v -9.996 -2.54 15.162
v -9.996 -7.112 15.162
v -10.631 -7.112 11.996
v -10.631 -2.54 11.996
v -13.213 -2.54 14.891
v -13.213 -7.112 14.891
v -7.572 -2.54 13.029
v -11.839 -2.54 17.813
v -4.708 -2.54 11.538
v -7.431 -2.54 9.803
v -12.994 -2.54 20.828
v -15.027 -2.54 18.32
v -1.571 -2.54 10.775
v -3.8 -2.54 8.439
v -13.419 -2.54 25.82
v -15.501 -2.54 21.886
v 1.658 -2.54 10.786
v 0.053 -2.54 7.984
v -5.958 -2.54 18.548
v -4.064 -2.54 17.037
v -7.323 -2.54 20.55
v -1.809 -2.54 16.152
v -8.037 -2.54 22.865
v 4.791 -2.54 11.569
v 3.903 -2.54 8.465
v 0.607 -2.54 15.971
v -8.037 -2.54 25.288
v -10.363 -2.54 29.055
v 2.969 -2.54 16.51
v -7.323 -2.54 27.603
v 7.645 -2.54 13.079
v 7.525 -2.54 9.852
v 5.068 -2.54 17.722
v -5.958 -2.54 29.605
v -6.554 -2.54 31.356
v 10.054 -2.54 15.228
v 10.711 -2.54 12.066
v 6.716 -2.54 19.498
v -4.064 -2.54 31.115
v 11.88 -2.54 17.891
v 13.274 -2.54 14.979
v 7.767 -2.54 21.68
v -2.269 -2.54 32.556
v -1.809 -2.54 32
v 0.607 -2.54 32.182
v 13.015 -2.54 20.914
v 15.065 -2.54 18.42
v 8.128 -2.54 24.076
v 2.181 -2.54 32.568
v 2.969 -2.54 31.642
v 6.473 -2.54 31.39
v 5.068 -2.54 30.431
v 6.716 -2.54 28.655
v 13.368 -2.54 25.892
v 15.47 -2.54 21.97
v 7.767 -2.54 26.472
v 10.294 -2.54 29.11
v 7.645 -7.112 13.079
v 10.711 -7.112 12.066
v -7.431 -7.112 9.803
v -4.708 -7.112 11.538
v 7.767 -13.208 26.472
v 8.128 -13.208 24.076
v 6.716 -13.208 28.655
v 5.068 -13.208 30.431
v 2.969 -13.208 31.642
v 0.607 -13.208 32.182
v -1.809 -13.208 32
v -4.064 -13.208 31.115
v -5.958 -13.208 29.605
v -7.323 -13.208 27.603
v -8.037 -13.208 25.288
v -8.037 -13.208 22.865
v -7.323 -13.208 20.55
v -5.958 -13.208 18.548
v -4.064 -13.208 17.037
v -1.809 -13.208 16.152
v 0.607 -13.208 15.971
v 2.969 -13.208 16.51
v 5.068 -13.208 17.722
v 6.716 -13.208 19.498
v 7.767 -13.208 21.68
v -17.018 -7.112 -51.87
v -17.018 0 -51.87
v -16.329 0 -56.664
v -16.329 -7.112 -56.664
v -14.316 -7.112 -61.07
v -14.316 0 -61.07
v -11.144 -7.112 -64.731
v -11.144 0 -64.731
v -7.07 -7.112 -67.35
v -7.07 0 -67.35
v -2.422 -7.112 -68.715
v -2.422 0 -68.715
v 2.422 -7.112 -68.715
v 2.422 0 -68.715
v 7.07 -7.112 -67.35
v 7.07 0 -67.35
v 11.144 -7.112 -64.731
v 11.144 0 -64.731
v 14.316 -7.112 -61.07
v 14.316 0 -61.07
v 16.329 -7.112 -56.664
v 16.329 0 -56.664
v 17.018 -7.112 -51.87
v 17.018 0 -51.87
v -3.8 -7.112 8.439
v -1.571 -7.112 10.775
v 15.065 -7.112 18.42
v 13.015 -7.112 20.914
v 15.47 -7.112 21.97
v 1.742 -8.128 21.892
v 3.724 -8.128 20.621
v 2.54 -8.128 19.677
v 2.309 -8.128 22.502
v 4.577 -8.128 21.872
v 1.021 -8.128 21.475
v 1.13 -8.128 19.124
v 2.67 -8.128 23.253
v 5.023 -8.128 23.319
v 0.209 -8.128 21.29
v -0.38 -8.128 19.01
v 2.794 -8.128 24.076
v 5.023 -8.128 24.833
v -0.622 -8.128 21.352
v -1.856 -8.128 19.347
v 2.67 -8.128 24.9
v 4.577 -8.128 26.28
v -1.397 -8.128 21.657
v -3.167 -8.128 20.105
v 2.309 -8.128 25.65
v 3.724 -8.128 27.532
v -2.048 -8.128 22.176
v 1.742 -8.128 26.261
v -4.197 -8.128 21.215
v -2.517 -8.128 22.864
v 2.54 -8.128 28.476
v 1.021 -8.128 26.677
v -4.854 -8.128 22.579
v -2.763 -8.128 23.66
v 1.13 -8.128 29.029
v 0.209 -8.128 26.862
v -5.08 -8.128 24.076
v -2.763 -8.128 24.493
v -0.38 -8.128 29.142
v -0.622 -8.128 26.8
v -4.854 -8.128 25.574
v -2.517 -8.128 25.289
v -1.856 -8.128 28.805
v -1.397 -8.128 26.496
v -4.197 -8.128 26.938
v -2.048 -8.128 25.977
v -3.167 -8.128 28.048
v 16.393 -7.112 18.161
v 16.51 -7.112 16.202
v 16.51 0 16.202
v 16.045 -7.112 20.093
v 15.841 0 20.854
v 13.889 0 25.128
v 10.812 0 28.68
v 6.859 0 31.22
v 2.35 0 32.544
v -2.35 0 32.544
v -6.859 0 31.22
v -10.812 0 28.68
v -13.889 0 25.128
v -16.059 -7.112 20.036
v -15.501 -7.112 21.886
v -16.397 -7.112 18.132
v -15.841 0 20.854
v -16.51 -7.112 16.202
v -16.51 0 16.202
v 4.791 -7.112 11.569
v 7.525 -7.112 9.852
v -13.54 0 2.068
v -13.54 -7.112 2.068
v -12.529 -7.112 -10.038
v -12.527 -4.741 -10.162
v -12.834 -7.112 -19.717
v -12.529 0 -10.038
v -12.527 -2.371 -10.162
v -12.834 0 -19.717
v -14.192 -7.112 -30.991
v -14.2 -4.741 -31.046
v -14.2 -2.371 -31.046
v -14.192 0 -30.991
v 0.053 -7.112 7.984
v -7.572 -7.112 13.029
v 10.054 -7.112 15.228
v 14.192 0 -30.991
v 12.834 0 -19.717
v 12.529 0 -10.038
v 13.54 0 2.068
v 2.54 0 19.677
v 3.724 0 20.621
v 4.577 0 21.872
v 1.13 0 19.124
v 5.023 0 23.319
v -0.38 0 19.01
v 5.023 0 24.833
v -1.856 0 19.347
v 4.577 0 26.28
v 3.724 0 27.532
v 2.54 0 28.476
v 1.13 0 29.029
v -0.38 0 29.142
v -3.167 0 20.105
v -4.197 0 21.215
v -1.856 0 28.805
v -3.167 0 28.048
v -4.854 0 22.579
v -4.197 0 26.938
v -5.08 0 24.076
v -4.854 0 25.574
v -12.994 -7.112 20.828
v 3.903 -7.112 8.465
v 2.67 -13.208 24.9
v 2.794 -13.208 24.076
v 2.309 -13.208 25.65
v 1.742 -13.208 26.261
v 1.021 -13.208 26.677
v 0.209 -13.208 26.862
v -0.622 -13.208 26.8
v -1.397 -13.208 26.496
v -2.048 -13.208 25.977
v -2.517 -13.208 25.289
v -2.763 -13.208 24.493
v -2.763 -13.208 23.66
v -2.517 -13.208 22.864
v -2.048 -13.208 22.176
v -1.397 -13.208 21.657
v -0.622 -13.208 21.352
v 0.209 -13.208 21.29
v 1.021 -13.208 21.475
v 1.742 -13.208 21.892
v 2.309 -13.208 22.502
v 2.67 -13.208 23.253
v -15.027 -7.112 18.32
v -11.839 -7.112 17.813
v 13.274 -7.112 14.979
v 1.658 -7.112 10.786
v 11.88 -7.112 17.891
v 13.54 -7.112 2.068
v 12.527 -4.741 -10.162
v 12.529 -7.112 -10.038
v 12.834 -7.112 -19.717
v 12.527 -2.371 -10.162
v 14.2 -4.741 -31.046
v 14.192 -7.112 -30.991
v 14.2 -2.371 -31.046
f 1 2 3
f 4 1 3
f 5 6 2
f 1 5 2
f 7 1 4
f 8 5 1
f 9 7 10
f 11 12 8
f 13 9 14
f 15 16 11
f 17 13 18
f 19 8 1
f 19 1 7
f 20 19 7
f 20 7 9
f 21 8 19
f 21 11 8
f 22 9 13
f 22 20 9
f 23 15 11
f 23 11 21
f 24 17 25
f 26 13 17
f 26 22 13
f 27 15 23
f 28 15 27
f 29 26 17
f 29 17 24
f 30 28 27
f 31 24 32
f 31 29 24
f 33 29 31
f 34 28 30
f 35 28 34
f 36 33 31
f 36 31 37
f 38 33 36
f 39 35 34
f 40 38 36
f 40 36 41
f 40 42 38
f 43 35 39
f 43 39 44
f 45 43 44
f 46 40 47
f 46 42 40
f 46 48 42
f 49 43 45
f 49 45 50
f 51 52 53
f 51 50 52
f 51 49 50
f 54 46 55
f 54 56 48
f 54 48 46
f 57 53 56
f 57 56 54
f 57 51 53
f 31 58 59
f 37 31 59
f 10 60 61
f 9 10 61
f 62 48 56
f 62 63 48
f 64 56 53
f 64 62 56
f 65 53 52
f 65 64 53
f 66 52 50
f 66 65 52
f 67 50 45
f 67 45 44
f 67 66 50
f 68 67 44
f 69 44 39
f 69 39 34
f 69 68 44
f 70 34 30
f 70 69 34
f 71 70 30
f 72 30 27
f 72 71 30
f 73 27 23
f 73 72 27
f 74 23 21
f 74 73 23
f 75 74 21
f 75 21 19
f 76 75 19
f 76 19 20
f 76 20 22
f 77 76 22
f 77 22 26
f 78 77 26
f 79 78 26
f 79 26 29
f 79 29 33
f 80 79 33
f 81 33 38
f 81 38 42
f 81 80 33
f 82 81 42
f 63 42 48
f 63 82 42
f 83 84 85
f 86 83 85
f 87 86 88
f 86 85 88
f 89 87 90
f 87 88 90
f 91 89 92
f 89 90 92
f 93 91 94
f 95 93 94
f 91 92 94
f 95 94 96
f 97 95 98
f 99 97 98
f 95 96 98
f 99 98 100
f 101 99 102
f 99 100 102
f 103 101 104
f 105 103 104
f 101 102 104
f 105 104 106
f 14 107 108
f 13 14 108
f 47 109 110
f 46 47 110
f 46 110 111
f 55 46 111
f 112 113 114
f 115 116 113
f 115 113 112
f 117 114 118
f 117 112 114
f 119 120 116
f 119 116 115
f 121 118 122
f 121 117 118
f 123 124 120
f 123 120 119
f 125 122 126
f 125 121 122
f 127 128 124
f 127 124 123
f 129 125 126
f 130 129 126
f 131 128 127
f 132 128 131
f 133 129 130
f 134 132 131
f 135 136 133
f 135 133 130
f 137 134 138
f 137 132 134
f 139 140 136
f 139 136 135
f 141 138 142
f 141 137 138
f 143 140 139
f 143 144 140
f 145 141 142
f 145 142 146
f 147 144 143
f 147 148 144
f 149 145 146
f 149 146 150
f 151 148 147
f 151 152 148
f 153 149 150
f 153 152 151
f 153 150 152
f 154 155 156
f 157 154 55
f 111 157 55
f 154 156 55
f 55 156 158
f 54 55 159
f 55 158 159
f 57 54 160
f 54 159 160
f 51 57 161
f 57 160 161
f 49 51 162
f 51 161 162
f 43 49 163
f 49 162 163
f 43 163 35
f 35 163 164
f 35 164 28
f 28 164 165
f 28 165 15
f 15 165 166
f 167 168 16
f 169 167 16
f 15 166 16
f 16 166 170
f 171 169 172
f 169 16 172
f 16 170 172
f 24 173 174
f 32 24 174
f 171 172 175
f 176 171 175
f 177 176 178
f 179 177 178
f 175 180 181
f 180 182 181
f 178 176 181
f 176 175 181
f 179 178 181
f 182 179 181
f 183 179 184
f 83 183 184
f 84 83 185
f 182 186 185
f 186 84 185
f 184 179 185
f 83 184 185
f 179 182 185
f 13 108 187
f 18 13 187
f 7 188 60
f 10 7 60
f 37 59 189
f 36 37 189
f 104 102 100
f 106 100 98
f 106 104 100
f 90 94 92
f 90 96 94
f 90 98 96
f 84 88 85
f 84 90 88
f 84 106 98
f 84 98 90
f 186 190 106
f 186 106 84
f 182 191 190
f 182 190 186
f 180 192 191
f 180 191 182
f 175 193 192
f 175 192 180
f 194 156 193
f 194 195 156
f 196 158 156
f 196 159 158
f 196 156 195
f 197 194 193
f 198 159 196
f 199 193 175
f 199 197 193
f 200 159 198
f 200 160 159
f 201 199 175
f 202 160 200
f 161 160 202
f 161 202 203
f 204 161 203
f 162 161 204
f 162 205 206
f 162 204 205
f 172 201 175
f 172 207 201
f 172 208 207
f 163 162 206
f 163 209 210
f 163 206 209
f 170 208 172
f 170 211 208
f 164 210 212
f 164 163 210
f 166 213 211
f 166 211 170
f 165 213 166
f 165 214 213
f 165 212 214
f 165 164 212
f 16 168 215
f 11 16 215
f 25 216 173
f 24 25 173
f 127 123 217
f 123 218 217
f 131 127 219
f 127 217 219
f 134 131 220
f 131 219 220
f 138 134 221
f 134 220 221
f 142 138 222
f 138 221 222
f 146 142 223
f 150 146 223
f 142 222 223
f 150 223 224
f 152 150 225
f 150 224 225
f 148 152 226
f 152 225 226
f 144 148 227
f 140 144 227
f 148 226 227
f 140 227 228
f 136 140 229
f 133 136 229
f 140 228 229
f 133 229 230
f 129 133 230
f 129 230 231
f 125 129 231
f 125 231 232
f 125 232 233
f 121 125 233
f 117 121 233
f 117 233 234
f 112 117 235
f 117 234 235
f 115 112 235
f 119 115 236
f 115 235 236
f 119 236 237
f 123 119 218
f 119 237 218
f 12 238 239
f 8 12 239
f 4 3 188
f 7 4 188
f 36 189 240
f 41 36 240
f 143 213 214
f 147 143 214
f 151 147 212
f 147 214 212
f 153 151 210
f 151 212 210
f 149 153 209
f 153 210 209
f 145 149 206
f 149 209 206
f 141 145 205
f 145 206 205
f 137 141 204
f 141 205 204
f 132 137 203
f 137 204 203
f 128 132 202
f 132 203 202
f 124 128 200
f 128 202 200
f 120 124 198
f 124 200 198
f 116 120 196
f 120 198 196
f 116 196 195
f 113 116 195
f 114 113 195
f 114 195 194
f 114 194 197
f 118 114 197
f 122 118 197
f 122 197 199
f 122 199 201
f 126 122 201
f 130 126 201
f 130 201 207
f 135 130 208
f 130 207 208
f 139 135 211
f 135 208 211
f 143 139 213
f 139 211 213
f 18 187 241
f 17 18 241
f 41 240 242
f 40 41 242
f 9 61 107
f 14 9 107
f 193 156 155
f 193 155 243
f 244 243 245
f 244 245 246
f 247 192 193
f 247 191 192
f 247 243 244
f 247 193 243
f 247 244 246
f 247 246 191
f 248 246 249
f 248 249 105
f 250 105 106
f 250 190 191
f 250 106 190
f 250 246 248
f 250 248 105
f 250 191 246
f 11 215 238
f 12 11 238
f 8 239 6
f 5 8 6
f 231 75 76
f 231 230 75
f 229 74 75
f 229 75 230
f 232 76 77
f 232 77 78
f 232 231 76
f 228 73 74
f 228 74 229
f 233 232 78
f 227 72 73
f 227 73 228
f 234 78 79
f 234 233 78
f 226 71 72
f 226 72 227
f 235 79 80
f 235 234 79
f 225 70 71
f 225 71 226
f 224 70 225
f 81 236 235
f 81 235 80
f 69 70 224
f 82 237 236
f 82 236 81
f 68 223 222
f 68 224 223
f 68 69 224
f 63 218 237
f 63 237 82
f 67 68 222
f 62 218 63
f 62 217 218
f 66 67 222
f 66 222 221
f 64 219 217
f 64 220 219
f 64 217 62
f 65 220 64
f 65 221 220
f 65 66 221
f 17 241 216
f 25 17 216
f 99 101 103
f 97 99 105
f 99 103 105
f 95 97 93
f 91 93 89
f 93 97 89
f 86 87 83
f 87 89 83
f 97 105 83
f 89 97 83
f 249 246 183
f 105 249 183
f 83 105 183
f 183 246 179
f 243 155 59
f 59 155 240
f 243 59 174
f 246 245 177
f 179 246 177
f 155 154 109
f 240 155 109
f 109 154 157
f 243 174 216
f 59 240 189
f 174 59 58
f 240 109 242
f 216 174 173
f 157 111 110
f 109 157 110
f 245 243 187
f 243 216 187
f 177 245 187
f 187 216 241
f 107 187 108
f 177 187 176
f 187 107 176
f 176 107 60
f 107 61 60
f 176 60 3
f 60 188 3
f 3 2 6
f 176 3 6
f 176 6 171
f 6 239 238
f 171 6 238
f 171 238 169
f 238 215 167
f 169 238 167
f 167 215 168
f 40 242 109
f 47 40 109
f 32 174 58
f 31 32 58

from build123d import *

# Parameters (mm, degrees)
F1_DEPTH = 7.112
F2_R     = 8.128
F2_R_2   = 2.794
F3_DEPTH = 6.096
F4_DEPTH = 50.8
F5_R     = 8.128
F6_DEPTH = 4.572
F7_R     = 5.08
F7_R_2   = 2.794
F8_DEPTH = 8.128


with BuildPart() as f1:
    # F0 (on Front) → F1 (new body)
    with BuildSketch(Plane.XZ):
        with BuildLine():
            add(Edge.make_bspline(
                [(16.51, 16.2022389048), (8.1950903917, -14.7107664531), (15.1309384414, -29.2677398155), (17.018, -51.8697610952)],
                knots=[0, 0, 0, 0, 68.073895496, 68.073895496, 68.073895496, 68.073895496], degree=3))
            ThreePointArc((16.51, 16.2022389048), (0, 32.7122389048), (-16.51, 16.2022389048))
            add(Edge.make_bspline(
                [(-16.51, 16.2022389048), (-8.1950903917, -14.7107664531), (-15.1309384414, -29.2677398155), (-17.018, -51.8697610952)],
                knots=[0, 0, 0, 0, 68.073895496, 68.073895496, 68.073895496, 68.073895496], degree=3))
            ThreePointArc((-17.018, -51.8697610952), (0, -68.8877610952), (17.018, -51.8697610952))
        make_face()
    extrude(amount=F1_DEPTH)

    # F2 (on face) → F3 (join)
    with BuildSketch(Plane.XZ.offset(7.112)):
        with Locations((0, 24.0762389048)):
            Circle(F2_R)
        with Locations((0, 24.0762389048)):
            Circle(F2_R_2, mode=Mode.SUBTRACT)
    extrude(amount=F3_DEPTH)

    # F4 (cut, symmetric): a face of the model
    f4_faces = [f1.faces().sort_by_distance(p)[0] for p in [
        (0, -7.112, 24.0762389048),
    ]]
    extrude(f4_faces, amount=F4_DEPTH, both=True, mode=Mode.SUBTRACT)

    # F5 (on face) → F6 (cut)
    with BuildSketch(Plane.XZ.offset(7.112)):
        with BuildLine():
            ThreePointArc((15.469928865, 21.9695087018), (-0.0442530739, 32.7121795972), (-15.5006234178, 21.8864955545))
            Line((-15.5006234178, 21.8864955545), (-12.9936152173, 20.8281131752))
            Line((-12.9936152173, 20.8281131752), (-15.0273981388, 18.3203464733))
            Line((-15.0273981388, 18.3203464733), (-11.8387170074, 17.8129221485))
            Line((-11.8387170074, 17.8129221485), (-13.2132540393, 14.8913104783))
            Line((-13.2132540393, 14.8913104783), (-9.995795597, 15.1617323254))
            Line((-9.995795597, 15.1617323254), (-10.6312036432, 11.9960691377))
            Line((-10.6312036432, 11.9960691377), (-7.5719548797, 13.0286212217))
            Line((-7.5719548797, 13.0286212217), (-7.4313063342, 9.8028833542))
            Line((-7.4313063342, 9.8028833542), (-4.7080596678, 11.5375575014))
            Line((-4.7080596678, 11.5375575014), (-3.7995285128, 8.4392131139))
            Line((-3.7995285128, 8.4392131139), (-1.570549141, 10.7751963679))
            Line((-1.570549141, 10.7751963679), (0.0530640951, 7.9843099742))
            Line((0.0530640951, 7.9843099742), (1.6582359931, 10.7858434794))
            Line((1.6582359931, 10.7858434794), (3.9025728106, 8.4646112522))
            Line((3.9025728106, 8.4646112522), (4.7906504787, 11.5688800644))
            Line((4.7906504787, 11.5688800644), (7.5252781797, 9.8522035834))
            Line((7.5252781797, 9.8522035834), (7.6446497718, 13.0787988828))
            Line((7.6446497718, 13.0787988828), (10.7106417342, 12.0664451452))
            Line((10.7106417342, 12.0664451452), (10.0543698074, 15.2278489412))
            Line((10.0543698074, 15.2278489412), (13.2735417227, 14.9786522665))
            Line((13.2735417227, 14.9786522665), (11.8797664159, 17.8911352617))
            Line((11.8797664159, 17.8911352617), (15.0650317137, 18.4195780548))
            Line((15.0650317137, 18.4195780548), (13.0147541814, 20.913877324))
            Line((13.0147541814, 20.913877324), (15.469928865, 21.9695087018))
        make_face()
        with BuildLine():
            Line((-11.7664292563, 17.8014187834), (-11.8387170074, 17.8129221485))
            Line((-11.8387170074, 17.8129221485), (-11.8075561021, 17.8791554056))
            ThreePointArc((-11.8075561021, 17.8791554056), (-11.7870567643, 17.84025319), (-11.7664292563, 17.8014187834))
        make_face(mode=Mode.SUBTRACT)
        with BuildLine():
            Line((-9.9228554611, 15.1678628183), (-9.995795597, 15.1617323254))
            Line((-9.995795597, 15.1617323254), (-9.9813908269, 15.2334982572))
            ThreePointArc((-9.9813908269, 15.2334982572), (-9.952177253, 15.2006322819), (-9.9228554611, 15.1678628183))
        make_face(mode=Mode.SUBTRACT)
        with BuildLine():
            Line((-12.9261809524, 20.7996444858), (-12.9936152173, 20.8281131752))
            Line((-12.9936152173, 20.8281131752), (-12.9475091354, 20.8849645215))
            ThreePointArc((-12.9475091354, 20.8849645215), (-12.9369153807, 20.842286921), (-12.9261809524, 20.7996444858))
        make_face(mode=Mode.SUBTRACT)
        with BuildLine():
            Line((-7.5026013746, 13.0520292908), (-7.5719548797, 13.0286212217))
            Line((-7.5719548797, 13.0286212217), (-7.5751433977, 13.1017490531))
            ThreePointArc((-7.5751433977, 13.1017490531), (-7.5389133745, 13.0768293692), (-7.5026013746, 13.0520292908))
        make_face(mode=Mode.SUBTRACT)
        with BuildLine():
            Line((-4.646323367, 11.5768827546), (-4.7080596678, 11.5375575014))
            Line((-4.7080596678, 11.5375575014), (-4.7286561687, 11.6077973086))
            ThreePointArc((-4.7286561687, 11.6077973086), (-4.6875152535, 11.5922721575), (-4.646323367, 11.5768827546))
        make_face(mode=Mode.SUBTRACT)
        with BuildLine():
            Line((-1.5200179341, 10.8281533646), (-1.570549141, 10.7751963679))
            Line((-1.570549141, 10.7751963679), (-1.6073566312, 10.8384660687))
            ThreePointArc((-1.6073566312, 10.8384660687), (-1.5636957843, 10.8332377157), (-1.5200179341, 10.8281533646))
        make_face(mode=Mode.SUBTRACT)
        with BuildLine():
            Line((1.6946254161, 10.8493545514), (1.6582359931, 10.7858434794))
            Line((1.6582359931, 10.7858434794), (1.6073566312, 10.8384660687))
            ThreePointArc((1.6073566312, 10.8384660687), (1.651, 10.8438383667), (1.6946254161, 10.8493545514))
        make_face(mode=Mode.SUBTRACT)
        with BuildLine():
            Line((4.8107832969, 11.639254179), (4.7906504787, 11.5688800644))
            Line((4.7906504787, 11.5688800644), (4.7286561687, 11.6077973086))
            ThreePointArc((4.7286561687, 11.6077973086), (4.7697456655, 11.6234580392), (4.8107832969, 11.639254179))
        make_face(mode=Mode.SUBTRACT)
        with BuildLine():
            Line((7.6473559389, 13.1519461522), (7.6446497718, 13.0787988828))
            Line((7.6446497718, 13.0787988828), (7.5751433977, 13.1017490531))
            ThreePointArc((7.5751433977, 13.1017490531), (7.6112910502, 13.1267880715), (7.6473559389, 13.1519461522))
        make_face(mode=Mode.SUBTRACT)
        with Locations((0, 24.0762389048)):
            Circle(F5_R, mode=Mode.SUBTRACT)
        with BuildLine():
            Line((11.8481693767, 17.9571615707), (11.8797664159, 17.8911352617))
            Line((11.8797664159, 17.8911352617), (11.8075561021, 17.8791554056))
            ThreePointArc((11.8075561021, 17.8791554056), (11.8279270467, 17.9181250071), (11.8481693767, 17.9571615707))
        make_face(mode=Mode.SUBTRACT)
        with BuildLine():
            Line((12.9682741648, 20.9704233621), (13.0147541814, 20.913877324))
            Line((13.0147541814, 20.913877324), (12.9475091354, 20.8849645215))
            ThreePointArc((12.9475091354, 20.8849645215), (12.9579621013, 20.9276768234), (12.9682741648, 20.9704233621))
        make_face(mode=Mode.SUBTRACT)
        with BuildLine():
            Line((-12.9475091354, 20.8849645215), (-12.9936152173, 20.8281131752))
            Line((-12.9936152173, 20.8281131752), (-12.9261809524, 20.7996444858))
            ThreePointArc((-12.9261809524, 20.7996444858), (-12.9369153807, 20.842286921), (-12.9475091354, 20.8849645215))
        make_face()
        with BuildLine():
            Line((-11.8075561021, 17.8791554056), (-11.8387170074, 17.8129221485))
            Line((-11.8387170074, 17.8129221485), (-11.7664292563, 17.8014187834))
            ThreePointArc((-11.7664292563, 17.8014187834), (-11.7870567643, 17.84025319), (-11.8075561021, 17.8791554056))
        make_face()
        with BuildLine():
            Line((-9.9813908269, 15.2334982572), (-9.995795597, 15.1617323254))
            Line((-9.995795597, 15.1617323254), (-9.9228554611, 15.1678628183))
            ThreePointArc((-9.9228554611, 15.1678628183), (-9.952177253, 15.2006322819), (-9.9813908269, 15.2334982572))
        make_face()
        with BuildLine():
            Line((-7.5751433977, 13.1017490531), (-7.5719548797, 13.0286212217))
            Line((-7.5719548797, 13.0286212217), (-7.5026013746, 13.0520292908))
            ThreePointArc((-7.5026013746, 13.0520292908), (-7.5389133745, 13.0768293692), (-7.5751433977, 13.1017490531))
        make_face()
        with BuildLine():
            Line((-4.7286561687, 11.6077973086), (-4.7080596678, 11.5375575014))
            Line((-4.7080596678, 11.5375575014), (-4.646323367, 11.5768827546))
            ThreePointArc((-4.646323367, 11.5768827546), (-4.6875152535, 11.5922721575), (-4.7286561687, 11.6077973086))
        make_face()
        with BuildLine():
            Line((-1.6073566312, 10.8384660687), (-1.570549141, 10.7751963679))
            Line((-1.570549141, 10.7751963679), (-1.5200179341, 10.8281533646))
            ThreePointArc((-1.5200179341, 10.8281533646), (-1.5636957843, 10.8332377157), (-1.6073566312, 10.8384660687))
        make_face()
        with BuildLine():
            Line((1.6073566312, 10.8384660687), (1.6582359931, 10.7858434794))
            Line((1.6582359931, 10.7858434794), (1.6946254161, 10.8493545514))
            ThreePointArc((1.6946254161, 10.8493545514), (1.651, 10.8438383667), (1.6073566312, 10.8384660687))
        make_face()
        with BuildLine():
            Line((4.7286561687, 11.6077973086), (4.7906504787, 11.5688800644))
            Line((4.7906504787, 11.5688800644), (4.8107832969, 11.639254179))
            ThreePointArc((4.8107832969, 11.639254179), (4.7697456655, 11.6234580392), (4.7286561687, 11.6077973086))
        make_face()
        with BuildLine():
            Line((7.5751433977, 13.1017490531), (7.6446497718, 13.0787988828))
            Line((7.6446497718, 13.0787988828), (7.6473559389, 13.1519461522))
            ThreePointArc((7.6473559389, 13.1519461522), (7.6112910502, 13.1267880715), (7.5751433977, 13.1017490531))
        make_face()
        with BuildLine():
            Line((11.8075561021, 17.8791554056), (11.8797664159, 17.8911352617))
            Line((11.8797664159, 17.8911352617), (11.8481693767, 17.9571615707))
            ThreePointArc((11.8481693767, 17.9571615707), (11.8279270467, 17.9181250071), (11.8075561021, 17.8791554056))
        make_face()
        with BuildLine():
            Line((12.9475091354, 20.8849645215), (13.0147541814, 20.913877324))
            Line((13.0147541814, 20.913877324), (12.9682741648, 20.9704233621))
            ThreePointArc((12.9682741648, 20.9704233621), (12.9579621013, 20.9276768234), (12.9475091354, 20.8849645215))
        make_face()
    extrude(amount=-F6_DEPTH, mode=Mode.SUBTRACT)

    # F7 (on face) → F8 (cut)
    with BuildSketch(Plane(origin=(0, 0, 0), x_dir=(-1, 0, 0), z_dir=(0, 1, 0))):
        with Locations((0, 24.0762389048)):
            Circle(F7_R)
        with Locations((0, 24.0762389048)):
            Circle(F7_R_2, mode=Mode.SUBTRACT)
    extrude(amount=-F8_DEPTH, mode=Mode.SUBTRACT)


solid = f1.part
